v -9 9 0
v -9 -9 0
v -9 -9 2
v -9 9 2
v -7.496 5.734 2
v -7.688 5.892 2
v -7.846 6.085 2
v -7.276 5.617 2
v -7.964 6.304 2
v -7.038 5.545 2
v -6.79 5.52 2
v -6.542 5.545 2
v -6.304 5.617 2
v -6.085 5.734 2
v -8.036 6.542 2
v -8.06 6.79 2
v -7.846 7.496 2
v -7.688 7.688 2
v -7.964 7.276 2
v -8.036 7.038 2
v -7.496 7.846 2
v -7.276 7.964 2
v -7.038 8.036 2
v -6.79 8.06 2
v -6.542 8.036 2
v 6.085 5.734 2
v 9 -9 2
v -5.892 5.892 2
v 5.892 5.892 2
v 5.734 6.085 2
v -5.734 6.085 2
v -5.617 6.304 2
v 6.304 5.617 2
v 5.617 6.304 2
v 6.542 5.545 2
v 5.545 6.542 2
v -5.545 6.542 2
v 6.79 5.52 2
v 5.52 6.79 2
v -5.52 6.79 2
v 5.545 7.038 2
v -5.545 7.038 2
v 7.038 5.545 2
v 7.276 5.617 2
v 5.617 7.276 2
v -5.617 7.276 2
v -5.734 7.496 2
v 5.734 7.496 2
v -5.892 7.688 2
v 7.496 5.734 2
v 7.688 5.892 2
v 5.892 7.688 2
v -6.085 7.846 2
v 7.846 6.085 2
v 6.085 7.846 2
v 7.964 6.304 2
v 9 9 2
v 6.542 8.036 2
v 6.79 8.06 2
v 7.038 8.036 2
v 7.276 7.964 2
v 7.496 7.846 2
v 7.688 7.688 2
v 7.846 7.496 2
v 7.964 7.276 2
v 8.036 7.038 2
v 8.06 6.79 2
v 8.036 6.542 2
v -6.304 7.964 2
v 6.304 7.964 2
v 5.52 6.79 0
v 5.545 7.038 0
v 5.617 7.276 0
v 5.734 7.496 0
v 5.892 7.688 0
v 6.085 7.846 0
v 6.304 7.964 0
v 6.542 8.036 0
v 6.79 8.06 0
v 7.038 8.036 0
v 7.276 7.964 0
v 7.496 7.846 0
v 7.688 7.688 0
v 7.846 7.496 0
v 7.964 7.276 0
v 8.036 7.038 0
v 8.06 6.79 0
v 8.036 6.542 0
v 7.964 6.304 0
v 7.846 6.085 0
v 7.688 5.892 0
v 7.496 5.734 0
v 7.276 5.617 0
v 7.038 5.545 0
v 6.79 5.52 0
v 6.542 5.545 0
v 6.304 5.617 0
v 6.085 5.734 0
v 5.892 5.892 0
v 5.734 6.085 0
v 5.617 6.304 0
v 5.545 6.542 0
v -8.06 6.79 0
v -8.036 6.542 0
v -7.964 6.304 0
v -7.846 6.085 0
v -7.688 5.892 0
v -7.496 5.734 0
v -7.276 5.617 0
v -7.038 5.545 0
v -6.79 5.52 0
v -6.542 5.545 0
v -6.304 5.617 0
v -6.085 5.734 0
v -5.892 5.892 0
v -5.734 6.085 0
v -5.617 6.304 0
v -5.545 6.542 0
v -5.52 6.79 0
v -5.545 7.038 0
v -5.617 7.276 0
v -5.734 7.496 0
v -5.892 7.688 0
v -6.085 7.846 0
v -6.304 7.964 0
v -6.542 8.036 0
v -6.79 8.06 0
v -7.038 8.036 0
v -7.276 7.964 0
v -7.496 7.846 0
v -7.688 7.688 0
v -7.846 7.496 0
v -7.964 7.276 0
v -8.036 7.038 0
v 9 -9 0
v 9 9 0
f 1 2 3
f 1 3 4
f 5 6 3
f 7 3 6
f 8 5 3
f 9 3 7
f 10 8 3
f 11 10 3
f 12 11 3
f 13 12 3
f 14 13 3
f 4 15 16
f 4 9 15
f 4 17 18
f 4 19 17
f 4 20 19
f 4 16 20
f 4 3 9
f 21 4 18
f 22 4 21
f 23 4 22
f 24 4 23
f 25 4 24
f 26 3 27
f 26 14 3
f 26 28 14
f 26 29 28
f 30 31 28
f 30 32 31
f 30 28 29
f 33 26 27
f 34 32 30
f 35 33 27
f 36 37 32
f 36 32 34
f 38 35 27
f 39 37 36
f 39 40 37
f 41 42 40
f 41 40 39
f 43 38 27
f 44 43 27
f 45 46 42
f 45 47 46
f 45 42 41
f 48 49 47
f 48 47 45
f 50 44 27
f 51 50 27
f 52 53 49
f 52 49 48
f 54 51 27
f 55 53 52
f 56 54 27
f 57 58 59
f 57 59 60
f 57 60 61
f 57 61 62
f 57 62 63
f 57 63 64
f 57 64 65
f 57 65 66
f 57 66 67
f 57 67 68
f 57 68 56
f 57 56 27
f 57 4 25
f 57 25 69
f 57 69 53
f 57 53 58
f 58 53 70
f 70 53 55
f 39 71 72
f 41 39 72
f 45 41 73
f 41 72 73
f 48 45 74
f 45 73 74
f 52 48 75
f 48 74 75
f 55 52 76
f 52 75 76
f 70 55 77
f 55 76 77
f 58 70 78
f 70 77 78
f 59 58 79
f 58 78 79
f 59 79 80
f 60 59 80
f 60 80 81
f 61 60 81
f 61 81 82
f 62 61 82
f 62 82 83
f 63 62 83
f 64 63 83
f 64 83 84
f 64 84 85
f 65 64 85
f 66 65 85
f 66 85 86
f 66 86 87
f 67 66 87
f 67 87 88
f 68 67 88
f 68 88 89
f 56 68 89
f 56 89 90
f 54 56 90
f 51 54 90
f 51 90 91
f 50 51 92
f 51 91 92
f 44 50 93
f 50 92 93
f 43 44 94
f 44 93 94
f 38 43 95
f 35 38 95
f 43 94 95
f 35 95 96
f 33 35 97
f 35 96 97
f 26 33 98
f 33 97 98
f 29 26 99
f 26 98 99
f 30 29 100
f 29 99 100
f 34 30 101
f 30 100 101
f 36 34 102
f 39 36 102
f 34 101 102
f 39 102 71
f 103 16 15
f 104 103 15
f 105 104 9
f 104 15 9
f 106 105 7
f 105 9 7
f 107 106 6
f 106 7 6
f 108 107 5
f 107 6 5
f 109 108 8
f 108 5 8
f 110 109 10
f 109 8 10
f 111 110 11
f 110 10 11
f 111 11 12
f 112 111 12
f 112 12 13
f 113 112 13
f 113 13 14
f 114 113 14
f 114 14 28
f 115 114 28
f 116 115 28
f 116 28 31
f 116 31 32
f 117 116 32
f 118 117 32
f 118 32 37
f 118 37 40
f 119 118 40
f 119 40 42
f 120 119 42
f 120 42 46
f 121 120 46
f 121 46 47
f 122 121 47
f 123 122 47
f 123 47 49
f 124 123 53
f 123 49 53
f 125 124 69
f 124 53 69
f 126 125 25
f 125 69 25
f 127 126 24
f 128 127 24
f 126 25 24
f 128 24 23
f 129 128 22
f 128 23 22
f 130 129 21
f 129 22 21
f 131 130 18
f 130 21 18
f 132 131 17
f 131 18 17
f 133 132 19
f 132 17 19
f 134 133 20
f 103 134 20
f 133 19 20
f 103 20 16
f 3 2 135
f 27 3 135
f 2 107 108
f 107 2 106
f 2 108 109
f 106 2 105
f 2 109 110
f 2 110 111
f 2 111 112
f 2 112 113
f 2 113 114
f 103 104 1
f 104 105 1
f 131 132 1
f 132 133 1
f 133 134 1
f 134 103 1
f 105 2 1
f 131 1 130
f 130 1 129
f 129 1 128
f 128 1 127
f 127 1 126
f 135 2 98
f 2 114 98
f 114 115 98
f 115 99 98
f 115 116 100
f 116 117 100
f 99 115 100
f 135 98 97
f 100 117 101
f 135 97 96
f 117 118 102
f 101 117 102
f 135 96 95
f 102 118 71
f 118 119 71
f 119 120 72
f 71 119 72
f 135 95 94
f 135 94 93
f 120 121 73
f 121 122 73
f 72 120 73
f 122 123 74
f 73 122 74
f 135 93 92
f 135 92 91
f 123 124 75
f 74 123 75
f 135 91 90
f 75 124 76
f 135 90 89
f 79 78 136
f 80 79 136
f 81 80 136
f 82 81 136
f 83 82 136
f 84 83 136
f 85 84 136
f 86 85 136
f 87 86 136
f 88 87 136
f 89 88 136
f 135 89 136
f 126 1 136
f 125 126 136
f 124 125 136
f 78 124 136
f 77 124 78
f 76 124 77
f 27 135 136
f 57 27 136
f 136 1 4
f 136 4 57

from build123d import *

# Parameters (mm, degrees)
F0_W     = 18
F0_H     = 18
F1_DEPTH = 2
F3_D     = 2.54
F5_D     = 2.54


with BuildPart() as f1:
    # F0 (on Top) → F1 (new body)
    with BuildSketch(Plane.XY):
        Rectangle(F0_W, F0_H)
    extrude(amount=F1_DEPTH)

    # F3 (through all)
    with Locations(Plane.XY.offset(2)):
        with Locations((6.7902, 6.7902)):
            Hole(F3_D / 2)

    # F5 (through all)
    with Locations(Plane(origin=(0, 0, 0), x_dir=(1, 0, 0), z_dir=(0, 0, -1))):
        with Locations((-6.7902, -6.7902)):
            Hole(F5_D / 2)


solid = f1.part
